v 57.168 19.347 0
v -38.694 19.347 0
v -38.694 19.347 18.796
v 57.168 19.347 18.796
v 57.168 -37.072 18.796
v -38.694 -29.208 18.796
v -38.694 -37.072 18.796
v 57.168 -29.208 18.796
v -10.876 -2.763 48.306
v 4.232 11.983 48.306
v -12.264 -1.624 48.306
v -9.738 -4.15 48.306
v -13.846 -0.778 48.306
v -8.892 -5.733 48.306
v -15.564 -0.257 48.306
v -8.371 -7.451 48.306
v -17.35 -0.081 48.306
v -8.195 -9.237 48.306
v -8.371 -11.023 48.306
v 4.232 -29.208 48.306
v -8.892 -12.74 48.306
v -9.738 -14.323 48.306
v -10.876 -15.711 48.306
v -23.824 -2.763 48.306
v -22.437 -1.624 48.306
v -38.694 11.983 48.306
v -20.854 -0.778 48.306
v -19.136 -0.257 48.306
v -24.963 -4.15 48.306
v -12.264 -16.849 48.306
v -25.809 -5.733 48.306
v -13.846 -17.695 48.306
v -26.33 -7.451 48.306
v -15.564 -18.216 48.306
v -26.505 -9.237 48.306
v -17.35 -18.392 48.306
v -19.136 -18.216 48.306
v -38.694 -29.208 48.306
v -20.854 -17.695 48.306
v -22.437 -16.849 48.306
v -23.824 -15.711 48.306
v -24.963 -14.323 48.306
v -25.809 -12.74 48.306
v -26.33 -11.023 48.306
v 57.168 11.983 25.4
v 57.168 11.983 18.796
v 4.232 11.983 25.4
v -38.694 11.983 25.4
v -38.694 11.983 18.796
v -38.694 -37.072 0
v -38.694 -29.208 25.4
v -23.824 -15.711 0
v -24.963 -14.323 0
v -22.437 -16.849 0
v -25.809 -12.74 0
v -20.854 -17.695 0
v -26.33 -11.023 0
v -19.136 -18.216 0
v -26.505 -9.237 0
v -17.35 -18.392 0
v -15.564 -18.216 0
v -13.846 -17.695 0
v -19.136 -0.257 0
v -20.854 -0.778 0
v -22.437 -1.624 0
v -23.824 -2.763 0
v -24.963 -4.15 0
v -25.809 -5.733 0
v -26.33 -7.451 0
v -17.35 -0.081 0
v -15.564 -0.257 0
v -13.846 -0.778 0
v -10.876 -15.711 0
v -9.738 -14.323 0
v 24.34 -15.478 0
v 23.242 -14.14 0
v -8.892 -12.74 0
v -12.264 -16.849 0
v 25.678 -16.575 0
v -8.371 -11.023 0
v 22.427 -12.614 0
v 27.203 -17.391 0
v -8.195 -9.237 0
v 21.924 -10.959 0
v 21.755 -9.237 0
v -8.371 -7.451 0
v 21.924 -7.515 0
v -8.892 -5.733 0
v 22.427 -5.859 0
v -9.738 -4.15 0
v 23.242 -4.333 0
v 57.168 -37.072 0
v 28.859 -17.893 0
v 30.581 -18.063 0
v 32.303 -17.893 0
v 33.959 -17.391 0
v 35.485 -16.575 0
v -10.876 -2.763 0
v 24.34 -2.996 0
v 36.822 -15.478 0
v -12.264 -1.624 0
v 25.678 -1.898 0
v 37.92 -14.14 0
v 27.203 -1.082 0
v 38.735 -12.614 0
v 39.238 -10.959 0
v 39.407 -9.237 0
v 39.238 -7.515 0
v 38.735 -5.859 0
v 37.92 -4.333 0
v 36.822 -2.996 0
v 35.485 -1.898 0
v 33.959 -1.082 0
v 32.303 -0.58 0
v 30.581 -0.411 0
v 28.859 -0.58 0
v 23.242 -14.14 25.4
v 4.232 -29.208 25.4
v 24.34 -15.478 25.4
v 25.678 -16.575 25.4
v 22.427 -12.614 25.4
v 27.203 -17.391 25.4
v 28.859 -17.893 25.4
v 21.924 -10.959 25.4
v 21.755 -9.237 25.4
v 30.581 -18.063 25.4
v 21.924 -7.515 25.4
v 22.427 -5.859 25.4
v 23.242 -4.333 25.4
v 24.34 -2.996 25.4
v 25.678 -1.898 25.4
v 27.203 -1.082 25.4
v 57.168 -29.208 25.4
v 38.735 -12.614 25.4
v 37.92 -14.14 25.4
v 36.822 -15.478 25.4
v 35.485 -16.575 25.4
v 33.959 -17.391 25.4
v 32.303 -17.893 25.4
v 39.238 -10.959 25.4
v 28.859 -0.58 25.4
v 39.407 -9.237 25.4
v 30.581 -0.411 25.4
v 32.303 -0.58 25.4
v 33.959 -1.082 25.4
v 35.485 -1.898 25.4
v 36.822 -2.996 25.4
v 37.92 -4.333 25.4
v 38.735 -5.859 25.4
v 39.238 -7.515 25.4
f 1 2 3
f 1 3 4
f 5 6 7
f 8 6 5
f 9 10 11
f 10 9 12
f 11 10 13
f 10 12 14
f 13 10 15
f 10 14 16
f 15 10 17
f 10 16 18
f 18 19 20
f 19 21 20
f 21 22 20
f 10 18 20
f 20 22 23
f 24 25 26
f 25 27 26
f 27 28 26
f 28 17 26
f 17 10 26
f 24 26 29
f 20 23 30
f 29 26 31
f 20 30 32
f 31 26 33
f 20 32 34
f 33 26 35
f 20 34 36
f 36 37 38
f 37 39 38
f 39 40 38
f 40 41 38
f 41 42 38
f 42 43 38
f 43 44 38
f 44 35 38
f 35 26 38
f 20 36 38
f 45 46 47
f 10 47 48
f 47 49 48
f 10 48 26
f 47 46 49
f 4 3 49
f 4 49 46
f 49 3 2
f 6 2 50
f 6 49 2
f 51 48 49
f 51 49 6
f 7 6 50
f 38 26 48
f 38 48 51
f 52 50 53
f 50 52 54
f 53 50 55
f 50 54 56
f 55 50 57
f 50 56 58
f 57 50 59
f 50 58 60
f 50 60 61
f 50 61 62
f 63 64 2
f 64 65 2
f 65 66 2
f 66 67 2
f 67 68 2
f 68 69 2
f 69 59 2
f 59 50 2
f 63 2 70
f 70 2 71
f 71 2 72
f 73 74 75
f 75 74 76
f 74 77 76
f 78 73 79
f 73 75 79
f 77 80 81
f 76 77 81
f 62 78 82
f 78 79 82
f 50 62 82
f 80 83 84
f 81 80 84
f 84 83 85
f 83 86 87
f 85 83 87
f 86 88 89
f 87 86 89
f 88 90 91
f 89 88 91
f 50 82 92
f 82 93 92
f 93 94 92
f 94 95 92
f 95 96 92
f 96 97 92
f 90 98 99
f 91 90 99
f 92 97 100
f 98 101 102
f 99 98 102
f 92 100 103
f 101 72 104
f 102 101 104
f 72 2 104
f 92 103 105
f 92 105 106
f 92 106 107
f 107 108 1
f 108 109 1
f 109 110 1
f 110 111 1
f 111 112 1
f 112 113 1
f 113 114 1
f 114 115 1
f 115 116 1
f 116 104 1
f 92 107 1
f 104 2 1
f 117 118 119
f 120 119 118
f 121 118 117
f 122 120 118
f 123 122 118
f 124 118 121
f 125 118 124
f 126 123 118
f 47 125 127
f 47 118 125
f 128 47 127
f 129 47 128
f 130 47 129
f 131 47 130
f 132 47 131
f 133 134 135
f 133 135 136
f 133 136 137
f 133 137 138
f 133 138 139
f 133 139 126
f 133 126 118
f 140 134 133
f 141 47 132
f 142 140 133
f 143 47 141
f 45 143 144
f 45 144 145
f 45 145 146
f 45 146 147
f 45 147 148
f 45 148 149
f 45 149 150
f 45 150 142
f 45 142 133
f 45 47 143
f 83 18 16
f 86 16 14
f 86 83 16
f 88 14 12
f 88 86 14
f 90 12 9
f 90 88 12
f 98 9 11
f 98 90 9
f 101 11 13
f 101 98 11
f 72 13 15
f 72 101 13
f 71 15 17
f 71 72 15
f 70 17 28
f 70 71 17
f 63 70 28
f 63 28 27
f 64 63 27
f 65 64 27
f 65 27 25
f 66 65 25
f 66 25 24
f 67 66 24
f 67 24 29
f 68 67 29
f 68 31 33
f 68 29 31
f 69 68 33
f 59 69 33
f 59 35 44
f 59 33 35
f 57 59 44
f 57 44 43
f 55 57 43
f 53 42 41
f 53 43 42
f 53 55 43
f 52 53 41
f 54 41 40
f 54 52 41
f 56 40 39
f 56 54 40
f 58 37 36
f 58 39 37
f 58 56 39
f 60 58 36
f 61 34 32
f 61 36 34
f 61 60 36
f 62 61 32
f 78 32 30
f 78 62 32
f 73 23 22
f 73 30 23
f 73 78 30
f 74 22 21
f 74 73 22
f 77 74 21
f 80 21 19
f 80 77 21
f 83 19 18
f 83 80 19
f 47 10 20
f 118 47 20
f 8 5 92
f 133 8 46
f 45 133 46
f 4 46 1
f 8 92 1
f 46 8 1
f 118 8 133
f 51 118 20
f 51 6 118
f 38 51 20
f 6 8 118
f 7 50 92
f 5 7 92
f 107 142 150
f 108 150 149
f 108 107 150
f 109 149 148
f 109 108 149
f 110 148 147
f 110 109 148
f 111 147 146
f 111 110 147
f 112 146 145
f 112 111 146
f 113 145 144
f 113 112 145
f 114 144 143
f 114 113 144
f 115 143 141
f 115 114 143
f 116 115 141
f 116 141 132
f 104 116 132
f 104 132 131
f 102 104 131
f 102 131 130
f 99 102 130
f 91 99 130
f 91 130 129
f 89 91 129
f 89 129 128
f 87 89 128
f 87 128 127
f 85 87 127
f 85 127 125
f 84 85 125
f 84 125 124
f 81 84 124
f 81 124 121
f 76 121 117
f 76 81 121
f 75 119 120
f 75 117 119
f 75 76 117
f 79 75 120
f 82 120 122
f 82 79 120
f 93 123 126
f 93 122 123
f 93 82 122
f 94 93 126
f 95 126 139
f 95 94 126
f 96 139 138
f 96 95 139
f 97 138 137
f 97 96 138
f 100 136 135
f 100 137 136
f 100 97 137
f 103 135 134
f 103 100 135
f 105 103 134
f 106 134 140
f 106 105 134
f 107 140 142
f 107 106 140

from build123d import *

# Parameters (mm, degrees)
F0_W     = 95.8622172475
F0_H     = 56.4189068973
F1_DEPTH = 25.4
F2_W     = 95.8622172475
F2_H     = 7.8636966646
F2_H_2   = 7.364413701
F3_DEPTH = 6.604
F4_W     = 41.1907965317
F4_H     = 22.9055710793
F5_DEPTH = 42.926
F6_R     = 9.155401704
F6_R_2   = 8.8261485634
F7_DEPTH = 92.964


with BuildPart() as f1:
    # F0 (on Top) → F1 (new body)
    with BuildSketch(Plane.XY):
        with Locations((9.2367231846, -8.8622625917)):
            Rectangle(F0_W, F0_H)
    extrude(amount=F1_DEPTH)

    # F2 (on face) → F3 (cut)
    with BuildSketch(Plane.XY.offset(25.4)):
        with Locations((9.2367231846, -33.1398677081)):
            Rectangle(F2_W, F2_H)
        with Locations((9.2367231846, 15.6649840064)):
            Rectangle(F2_W, F2_H_2)
    extrude(amount=-F3_DEPTH, mode=Mode.SUBTRACT)

    # F4 (on face) → F5 (join)
    with BuildSketch(Plane(origin=(-38.6943854392, 0, 0), x_dir=(0, -1, 0), z_dir=(-1, 0, 0))):
        with Locations((8.6126211099, 36.8527855396)):
            Rectangle(F4_W, F4_H)
    extrude(amount=-F5_DEPTH)

    # F6 (on Top) → F7 (cut)
    with BuildSketch(Plane.XY):
        with Locations((-17.3500627279, -9.2367241159)):
            Circle(F6_R)
        with Locations((30.5810458958, -9.2367241159)):
            Circle(F6_R_2)
    extrude(amount=F7_DEPTH, mode=Mode.SUBTRACT)


solid = f1.part
